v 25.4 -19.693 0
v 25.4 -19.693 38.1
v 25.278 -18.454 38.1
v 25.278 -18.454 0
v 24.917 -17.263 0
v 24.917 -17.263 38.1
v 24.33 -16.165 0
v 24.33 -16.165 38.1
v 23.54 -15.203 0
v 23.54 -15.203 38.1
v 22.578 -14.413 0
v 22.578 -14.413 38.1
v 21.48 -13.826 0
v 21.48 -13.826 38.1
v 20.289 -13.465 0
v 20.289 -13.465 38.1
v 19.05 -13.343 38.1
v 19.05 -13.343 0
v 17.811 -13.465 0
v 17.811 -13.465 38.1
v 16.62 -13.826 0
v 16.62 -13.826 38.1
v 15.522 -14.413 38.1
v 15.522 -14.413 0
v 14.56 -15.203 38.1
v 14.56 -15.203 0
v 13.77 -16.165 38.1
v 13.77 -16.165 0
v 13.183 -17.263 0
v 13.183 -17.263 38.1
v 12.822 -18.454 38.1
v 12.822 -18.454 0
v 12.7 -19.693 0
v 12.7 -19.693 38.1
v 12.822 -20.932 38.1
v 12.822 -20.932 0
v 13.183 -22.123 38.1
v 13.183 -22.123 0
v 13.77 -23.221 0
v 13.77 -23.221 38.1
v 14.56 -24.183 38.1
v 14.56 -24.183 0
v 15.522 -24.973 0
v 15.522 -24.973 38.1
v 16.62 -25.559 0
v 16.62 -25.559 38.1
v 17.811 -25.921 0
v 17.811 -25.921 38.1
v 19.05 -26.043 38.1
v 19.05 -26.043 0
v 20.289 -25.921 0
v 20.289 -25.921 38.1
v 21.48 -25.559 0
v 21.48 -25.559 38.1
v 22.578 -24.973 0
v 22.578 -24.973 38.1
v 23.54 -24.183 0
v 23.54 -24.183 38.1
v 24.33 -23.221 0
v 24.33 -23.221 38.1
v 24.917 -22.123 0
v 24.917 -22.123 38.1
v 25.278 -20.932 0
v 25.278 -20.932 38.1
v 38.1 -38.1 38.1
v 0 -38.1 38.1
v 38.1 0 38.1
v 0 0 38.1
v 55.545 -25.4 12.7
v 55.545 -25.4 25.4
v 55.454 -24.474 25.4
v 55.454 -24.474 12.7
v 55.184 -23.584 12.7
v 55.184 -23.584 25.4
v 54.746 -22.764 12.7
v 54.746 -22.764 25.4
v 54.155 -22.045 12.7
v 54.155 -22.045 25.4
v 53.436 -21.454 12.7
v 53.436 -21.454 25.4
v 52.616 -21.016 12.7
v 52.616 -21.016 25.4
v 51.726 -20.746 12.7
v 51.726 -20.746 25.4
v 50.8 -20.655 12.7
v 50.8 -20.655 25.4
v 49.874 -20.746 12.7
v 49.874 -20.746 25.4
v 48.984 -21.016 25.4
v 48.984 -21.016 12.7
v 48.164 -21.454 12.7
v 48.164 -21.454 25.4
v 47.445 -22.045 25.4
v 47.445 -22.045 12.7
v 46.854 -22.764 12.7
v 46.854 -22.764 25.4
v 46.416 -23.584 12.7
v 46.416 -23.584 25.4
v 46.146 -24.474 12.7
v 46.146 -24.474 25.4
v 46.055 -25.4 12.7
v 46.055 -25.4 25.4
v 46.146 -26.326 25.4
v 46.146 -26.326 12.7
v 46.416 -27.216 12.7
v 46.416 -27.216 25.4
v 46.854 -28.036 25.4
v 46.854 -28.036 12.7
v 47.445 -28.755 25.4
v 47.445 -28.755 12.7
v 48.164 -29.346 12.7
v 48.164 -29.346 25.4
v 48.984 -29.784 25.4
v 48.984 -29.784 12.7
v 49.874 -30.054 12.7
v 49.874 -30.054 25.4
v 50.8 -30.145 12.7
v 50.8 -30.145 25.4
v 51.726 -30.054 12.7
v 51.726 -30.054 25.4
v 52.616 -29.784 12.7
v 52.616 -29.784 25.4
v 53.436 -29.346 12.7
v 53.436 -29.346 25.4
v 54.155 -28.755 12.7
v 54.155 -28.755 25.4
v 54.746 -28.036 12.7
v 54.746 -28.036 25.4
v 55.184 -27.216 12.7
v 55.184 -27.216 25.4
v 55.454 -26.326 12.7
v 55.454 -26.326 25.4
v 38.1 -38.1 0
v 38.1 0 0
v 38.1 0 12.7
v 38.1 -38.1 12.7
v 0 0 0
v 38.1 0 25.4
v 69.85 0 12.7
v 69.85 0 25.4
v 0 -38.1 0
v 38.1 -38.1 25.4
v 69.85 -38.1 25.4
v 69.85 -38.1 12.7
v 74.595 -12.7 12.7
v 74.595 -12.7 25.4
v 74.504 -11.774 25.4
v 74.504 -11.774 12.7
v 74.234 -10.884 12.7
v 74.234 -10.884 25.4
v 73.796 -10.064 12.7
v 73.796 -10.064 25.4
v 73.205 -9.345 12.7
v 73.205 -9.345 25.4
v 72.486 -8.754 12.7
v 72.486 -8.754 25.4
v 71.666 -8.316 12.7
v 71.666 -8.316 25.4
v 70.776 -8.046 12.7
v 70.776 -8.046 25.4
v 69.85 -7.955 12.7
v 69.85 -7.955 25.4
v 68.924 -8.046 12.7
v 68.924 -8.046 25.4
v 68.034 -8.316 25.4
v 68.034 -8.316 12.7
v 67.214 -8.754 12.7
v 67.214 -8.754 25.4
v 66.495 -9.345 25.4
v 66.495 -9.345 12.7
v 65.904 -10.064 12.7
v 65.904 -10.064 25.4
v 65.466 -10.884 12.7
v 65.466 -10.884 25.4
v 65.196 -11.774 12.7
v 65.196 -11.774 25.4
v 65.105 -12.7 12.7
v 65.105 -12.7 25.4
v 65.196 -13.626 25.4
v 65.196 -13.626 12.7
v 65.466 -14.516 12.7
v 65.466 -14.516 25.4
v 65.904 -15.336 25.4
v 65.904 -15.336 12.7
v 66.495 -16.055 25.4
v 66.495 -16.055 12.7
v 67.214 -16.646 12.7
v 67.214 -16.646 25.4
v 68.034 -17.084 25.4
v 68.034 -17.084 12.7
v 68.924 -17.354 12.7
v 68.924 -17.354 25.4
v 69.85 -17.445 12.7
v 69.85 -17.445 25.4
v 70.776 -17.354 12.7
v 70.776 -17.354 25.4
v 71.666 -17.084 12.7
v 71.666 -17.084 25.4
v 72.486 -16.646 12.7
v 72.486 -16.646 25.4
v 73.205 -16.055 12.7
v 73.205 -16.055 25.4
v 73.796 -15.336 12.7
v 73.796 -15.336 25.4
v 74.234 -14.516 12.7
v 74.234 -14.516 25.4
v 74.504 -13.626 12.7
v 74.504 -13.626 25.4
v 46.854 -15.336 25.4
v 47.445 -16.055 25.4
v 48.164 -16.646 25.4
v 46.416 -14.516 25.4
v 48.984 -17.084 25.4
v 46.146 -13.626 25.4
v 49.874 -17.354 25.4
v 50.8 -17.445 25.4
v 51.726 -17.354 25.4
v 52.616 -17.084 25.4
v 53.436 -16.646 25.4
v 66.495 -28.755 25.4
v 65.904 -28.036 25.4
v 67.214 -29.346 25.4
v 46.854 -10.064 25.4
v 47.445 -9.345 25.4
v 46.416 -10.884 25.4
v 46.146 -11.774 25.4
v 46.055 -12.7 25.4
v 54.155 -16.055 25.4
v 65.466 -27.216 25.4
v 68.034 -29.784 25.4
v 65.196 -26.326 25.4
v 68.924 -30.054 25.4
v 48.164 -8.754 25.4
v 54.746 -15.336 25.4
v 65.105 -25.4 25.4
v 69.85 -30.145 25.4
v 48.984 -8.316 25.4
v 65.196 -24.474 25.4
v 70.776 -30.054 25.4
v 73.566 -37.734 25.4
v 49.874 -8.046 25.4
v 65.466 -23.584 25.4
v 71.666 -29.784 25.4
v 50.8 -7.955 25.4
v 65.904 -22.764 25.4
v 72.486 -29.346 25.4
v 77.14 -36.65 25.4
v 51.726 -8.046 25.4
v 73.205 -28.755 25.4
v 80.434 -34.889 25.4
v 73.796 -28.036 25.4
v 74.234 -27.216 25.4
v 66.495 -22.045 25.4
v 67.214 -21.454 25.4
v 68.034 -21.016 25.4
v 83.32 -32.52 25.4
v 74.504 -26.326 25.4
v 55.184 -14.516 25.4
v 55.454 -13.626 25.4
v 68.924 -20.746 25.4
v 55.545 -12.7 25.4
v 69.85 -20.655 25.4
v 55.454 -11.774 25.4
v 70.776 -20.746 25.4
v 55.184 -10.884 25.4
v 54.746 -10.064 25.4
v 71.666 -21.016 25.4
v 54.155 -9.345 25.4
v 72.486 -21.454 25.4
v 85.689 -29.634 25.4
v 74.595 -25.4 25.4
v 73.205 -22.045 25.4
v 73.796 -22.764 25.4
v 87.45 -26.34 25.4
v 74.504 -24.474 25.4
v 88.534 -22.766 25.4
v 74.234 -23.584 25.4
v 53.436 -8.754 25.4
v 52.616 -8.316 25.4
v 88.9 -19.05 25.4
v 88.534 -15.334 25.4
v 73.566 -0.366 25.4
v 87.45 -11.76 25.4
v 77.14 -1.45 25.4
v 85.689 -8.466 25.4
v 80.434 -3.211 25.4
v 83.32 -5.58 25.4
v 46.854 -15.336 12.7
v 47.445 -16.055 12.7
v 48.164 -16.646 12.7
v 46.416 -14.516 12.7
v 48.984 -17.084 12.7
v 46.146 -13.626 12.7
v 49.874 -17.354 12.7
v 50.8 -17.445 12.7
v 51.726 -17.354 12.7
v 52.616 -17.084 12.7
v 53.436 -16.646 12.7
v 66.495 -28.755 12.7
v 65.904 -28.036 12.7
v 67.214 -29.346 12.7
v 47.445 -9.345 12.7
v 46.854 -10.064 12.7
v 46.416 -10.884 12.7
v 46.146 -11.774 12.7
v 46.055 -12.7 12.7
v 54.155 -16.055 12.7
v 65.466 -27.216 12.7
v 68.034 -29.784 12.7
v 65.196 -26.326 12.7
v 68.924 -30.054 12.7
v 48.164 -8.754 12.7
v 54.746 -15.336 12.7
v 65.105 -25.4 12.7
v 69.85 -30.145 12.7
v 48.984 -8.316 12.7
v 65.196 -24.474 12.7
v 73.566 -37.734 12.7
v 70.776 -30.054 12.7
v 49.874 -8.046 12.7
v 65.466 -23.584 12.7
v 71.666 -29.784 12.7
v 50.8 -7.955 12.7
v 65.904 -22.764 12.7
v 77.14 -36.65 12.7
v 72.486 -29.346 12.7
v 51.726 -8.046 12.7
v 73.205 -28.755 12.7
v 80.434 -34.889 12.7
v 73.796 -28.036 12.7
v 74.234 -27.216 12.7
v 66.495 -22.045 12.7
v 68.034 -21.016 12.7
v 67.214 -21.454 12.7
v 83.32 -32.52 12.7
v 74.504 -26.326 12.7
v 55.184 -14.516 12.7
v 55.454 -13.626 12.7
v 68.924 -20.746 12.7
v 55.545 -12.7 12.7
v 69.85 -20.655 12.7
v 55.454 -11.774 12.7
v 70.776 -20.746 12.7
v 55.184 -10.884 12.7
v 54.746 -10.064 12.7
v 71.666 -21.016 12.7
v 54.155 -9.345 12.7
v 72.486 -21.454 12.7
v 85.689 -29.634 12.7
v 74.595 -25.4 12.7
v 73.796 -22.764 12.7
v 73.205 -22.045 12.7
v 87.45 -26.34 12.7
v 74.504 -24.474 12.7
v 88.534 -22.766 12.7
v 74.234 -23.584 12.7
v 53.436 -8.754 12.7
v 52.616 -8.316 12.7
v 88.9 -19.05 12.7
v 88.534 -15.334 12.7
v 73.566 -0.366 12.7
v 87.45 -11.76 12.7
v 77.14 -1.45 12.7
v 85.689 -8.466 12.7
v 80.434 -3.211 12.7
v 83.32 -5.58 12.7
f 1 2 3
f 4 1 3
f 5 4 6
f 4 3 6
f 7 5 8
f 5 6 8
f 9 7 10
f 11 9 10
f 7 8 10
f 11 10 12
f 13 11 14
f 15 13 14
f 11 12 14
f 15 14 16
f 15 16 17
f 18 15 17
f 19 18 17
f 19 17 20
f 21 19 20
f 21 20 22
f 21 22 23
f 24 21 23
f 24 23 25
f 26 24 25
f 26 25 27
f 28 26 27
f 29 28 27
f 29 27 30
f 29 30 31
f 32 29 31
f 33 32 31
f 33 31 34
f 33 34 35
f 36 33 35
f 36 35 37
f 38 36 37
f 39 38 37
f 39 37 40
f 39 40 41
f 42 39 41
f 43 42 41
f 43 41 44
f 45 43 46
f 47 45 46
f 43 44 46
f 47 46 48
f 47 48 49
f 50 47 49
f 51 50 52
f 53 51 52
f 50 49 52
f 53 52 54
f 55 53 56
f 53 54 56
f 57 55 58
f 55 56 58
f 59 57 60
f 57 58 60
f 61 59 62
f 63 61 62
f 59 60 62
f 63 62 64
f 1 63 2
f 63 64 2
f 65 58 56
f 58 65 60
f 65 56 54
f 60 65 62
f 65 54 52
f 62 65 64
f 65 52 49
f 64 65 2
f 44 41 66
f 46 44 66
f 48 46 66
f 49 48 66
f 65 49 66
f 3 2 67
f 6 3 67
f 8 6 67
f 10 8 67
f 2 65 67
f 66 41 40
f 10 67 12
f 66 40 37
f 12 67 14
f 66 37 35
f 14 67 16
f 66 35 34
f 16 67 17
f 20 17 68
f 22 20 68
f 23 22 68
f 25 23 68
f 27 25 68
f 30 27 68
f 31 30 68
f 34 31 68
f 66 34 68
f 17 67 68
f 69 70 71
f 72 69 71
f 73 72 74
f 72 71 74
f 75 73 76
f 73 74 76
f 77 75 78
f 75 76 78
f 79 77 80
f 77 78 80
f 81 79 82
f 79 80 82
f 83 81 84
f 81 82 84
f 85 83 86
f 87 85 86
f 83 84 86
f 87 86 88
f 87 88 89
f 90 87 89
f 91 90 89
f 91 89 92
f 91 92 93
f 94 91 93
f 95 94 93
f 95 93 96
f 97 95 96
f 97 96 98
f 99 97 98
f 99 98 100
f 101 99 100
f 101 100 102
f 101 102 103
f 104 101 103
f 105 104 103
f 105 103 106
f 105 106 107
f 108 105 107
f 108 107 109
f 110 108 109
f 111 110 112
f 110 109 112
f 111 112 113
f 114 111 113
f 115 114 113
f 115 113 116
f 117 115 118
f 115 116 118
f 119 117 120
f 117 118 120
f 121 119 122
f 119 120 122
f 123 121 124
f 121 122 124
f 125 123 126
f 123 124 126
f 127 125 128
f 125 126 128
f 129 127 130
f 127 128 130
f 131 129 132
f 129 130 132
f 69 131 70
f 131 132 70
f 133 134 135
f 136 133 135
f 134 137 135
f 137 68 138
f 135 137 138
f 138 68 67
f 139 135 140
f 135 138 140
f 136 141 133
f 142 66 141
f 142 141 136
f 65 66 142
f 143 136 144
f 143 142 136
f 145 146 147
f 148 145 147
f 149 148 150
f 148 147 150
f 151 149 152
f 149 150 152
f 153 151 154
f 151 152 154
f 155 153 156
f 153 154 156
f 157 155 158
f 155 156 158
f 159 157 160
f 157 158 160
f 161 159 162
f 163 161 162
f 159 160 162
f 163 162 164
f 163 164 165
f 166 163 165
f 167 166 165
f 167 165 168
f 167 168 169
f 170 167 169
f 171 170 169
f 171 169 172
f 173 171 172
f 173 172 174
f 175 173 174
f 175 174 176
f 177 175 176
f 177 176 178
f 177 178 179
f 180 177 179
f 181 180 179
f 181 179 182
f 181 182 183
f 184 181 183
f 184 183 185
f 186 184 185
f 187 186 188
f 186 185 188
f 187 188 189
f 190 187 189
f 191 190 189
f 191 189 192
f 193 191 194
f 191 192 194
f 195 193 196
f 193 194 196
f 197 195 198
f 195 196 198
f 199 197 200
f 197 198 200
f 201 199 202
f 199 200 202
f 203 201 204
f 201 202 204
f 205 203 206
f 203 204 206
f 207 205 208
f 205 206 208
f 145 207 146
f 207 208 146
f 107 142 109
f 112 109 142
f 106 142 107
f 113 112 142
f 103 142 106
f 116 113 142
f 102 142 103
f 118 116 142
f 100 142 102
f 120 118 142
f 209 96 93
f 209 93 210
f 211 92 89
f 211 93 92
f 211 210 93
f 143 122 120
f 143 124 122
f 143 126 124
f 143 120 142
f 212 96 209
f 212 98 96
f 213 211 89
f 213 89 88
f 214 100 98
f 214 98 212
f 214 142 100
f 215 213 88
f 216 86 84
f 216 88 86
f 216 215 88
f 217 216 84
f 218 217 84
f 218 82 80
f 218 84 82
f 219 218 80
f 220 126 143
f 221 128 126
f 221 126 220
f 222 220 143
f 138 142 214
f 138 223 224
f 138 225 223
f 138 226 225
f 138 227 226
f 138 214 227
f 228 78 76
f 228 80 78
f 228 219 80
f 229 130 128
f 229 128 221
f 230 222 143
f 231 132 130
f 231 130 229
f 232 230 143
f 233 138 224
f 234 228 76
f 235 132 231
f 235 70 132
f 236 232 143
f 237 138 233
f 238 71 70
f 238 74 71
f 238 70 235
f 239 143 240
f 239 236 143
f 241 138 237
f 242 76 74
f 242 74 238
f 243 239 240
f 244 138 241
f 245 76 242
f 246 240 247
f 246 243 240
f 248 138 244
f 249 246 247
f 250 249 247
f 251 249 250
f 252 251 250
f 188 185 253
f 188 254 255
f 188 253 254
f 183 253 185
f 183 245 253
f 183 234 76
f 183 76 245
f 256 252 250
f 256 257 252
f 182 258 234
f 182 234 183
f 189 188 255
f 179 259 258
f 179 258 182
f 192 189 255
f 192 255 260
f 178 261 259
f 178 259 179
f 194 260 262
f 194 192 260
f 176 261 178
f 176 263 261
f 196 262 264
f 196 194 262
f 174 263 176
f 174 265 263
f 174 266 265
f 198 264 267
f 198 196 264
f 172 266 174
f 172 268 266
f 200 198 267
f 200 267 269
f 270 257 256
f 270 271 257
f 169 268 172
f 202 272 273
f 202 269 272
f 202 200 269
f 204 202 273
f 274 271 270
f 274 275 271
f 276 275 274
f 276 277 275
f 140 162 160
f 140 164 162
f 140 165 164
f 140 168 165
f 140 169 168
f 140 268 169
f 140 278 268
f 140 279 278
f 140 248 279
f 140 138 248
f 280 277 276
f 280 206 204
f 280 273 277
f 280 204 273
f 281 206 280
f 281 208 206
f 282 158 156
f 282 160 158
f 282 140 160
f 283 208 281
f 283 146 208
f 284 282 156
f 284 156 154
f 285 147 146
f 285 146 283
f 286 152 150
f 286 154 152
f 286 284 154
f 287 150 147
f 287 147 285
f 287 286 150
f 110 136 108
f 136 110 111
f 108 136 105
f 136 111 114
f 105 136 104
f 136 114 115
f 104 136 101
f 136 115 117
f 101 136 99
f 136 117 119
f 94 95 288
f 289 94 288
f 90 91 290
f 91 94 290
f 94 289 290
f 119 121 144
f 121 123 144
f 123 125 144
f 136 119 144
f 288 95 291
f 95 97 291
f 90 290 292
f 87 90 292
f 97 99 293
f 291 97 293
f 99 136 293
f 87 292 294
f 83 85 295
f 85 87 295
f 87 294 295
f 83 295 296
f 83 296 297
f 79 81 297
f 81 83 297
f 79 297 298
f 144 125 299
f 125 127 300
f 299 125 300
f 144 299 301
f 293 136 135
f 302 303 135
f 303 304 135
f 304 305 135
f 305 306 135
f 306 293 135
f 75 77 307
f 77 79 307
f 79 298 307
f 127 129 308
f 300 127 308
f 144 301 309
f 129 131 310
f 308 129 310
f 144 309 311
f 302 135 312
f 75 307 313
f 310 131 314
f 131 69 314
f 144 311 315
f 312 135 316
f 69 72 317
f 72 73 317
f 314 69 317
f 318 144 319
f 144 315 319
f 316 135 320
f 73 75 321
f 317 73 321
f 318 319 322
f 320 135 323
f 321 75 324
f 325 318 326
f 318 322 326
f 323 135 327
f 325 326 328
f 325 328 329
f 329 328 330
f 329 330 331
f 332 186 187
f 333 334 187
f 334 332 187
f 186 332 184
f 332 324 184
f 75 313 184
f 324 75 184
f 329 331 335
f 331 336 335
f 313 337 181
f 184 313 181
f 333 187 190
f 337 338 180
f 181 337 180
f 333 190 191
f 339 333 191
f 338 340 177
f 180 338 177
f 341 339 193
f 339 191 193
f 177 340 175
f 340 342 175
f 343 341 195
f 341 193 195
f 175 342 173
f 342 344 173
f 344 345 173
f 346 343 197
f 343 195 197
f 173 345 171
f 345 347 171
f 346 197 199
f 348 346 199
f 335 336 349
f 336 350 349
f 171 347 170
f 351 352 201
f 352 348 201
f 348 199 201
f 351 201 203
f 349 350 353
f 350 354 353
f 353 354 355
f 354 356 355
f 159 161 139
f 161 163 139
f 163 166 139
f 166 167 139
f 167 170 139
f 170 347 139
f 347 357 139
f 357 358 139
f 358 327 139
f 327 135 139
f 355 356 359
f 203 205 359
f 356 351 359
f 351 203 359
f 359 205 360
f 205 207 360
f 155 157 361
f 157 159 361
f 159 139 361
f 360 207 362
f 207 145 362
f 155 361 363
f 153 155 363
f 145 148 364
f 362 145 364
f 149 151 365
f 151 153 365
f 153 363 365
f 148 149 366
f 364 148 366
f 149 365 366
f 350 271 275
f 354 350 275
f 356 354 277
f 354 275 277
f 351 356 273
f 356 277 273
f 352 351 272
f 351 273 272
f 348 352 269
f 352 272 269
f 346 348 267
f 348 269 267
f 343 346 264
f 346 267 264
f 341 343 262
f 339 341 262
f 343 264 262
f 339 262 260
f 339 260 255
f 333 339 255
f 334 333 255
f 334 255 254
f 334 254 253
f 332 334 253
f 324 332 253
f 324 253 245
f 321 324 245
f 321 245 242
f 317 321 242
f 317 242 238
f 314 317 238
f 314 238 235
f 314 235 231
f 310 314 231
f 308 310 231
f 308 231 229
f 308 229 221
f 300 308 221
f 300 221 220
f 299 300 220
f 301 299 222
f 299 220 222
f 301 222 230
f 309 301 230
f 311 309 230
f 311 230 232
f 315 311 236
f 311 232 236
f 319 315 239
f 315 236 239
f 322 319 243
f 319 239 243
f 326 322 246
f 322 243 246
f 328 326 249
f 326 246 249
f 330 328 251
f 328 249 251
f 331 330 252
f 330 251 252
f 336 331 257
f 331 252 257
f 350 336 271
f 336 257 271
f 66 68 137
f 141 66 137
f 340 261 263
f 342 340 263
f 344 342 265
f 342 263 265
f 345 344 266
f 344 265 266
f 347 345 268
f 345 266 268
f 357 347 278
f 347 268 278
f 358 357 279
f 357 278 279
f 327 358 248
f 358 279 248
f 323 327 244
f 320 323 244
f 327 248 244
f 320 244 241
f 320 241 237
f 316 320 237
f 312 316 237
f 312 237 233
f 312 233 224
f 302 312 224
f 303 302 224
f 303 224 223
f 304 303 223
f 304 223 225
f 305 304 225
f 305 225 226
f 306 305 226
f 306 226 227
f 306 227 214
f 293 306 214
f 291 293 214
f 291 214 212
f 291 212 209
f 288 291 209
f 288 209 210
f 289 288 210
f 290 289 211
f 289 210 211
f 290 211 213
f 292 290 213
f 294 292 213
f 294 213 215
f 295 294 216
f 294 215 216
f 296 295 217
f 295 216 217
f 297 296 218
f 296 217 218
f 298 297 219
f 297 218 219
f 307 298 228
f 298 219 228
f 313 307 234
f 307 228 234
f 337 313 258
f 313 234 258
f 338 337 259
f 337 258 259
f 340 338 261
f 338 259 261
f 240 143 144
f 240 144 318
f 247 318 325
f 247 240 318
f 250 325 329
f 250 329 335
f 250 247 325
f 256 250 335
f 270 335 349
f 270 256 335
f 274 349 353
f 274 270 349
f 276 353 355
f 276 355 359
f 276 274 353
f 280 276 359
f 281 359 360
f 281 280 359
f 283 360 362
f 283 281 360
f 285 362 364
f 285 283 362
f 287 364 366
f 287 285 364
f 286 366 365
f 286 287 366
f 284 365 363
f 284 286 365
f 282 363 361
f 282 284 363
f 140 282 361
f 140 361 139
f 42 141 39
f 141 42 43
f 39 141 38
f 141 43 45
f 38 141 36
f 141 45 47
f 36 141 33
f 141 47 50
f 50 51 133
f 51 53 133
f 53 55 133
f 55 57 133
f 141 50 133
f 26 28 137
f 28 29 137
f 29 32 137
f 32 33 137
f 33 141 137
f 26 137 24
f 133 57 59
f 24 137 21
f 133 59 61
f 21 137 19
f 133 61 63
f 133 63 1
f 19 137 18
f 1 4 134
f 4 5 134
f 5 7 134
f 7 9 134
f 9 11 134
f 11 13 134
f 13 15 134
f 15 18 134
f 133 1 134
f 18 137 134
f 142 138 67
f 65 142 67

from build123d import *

# Parameters (mm, degrees)
F1_DEPTH = 38.1
F3_DEPTH = 12.7
F4_R     = 6.35
F4_R_2   = 4.745300615
F5_DEPTH = 38.101


# Not quite as in the source:
# - a feature names something its author has since deleted; it is built from what else it names


with BuildPart() as f1:
    # F0 (on Front) → F1 (new body)
    with BuildSketch(Plane.XZ):
        Polygon((0, 38.1), (0, 0), (38.1, 0), (38.1, 12.7), (69.85, 12.7), (69.85, 25.4), (38.1, 25.4), (38.1, 38.1), align=None)
    extrude(amount=F1_DEPTH)

    # F2 (on face) → F3 (join)
    with BuildSketch(Plane.XY.offset(25.4)):
        with BuildLine():
            Line((69.85, 0), (69.85, -38.1))
            ThreePointArc((69.85, -38.1), (88.9, -19.05), (69.85, 0))
        make_face()
    extrude(amount=-F3_DEPTH)

    # F4 (on face) → F5 (cut, through all)
    with BuildSketch(Plane.XY.offset(38.1)):
        with Locations((19.05, -19.6927841753)):
            Circle(F4_R)
        with Locations((50.8, -12.7)):
            Circle(F4_R_2)
        with Locations((50.8, -25.4)):
            Circle(F4_R_2)
        with Locations((69.85, -25.4)):
            Circle(F4_R_2)
        with Locations((69.85, -12.7)):
            Circle(F4_R_2)
    extrude(amount=-F5_DEPTH, mode=Mode.SUBTRACT)


solid = f1.part
